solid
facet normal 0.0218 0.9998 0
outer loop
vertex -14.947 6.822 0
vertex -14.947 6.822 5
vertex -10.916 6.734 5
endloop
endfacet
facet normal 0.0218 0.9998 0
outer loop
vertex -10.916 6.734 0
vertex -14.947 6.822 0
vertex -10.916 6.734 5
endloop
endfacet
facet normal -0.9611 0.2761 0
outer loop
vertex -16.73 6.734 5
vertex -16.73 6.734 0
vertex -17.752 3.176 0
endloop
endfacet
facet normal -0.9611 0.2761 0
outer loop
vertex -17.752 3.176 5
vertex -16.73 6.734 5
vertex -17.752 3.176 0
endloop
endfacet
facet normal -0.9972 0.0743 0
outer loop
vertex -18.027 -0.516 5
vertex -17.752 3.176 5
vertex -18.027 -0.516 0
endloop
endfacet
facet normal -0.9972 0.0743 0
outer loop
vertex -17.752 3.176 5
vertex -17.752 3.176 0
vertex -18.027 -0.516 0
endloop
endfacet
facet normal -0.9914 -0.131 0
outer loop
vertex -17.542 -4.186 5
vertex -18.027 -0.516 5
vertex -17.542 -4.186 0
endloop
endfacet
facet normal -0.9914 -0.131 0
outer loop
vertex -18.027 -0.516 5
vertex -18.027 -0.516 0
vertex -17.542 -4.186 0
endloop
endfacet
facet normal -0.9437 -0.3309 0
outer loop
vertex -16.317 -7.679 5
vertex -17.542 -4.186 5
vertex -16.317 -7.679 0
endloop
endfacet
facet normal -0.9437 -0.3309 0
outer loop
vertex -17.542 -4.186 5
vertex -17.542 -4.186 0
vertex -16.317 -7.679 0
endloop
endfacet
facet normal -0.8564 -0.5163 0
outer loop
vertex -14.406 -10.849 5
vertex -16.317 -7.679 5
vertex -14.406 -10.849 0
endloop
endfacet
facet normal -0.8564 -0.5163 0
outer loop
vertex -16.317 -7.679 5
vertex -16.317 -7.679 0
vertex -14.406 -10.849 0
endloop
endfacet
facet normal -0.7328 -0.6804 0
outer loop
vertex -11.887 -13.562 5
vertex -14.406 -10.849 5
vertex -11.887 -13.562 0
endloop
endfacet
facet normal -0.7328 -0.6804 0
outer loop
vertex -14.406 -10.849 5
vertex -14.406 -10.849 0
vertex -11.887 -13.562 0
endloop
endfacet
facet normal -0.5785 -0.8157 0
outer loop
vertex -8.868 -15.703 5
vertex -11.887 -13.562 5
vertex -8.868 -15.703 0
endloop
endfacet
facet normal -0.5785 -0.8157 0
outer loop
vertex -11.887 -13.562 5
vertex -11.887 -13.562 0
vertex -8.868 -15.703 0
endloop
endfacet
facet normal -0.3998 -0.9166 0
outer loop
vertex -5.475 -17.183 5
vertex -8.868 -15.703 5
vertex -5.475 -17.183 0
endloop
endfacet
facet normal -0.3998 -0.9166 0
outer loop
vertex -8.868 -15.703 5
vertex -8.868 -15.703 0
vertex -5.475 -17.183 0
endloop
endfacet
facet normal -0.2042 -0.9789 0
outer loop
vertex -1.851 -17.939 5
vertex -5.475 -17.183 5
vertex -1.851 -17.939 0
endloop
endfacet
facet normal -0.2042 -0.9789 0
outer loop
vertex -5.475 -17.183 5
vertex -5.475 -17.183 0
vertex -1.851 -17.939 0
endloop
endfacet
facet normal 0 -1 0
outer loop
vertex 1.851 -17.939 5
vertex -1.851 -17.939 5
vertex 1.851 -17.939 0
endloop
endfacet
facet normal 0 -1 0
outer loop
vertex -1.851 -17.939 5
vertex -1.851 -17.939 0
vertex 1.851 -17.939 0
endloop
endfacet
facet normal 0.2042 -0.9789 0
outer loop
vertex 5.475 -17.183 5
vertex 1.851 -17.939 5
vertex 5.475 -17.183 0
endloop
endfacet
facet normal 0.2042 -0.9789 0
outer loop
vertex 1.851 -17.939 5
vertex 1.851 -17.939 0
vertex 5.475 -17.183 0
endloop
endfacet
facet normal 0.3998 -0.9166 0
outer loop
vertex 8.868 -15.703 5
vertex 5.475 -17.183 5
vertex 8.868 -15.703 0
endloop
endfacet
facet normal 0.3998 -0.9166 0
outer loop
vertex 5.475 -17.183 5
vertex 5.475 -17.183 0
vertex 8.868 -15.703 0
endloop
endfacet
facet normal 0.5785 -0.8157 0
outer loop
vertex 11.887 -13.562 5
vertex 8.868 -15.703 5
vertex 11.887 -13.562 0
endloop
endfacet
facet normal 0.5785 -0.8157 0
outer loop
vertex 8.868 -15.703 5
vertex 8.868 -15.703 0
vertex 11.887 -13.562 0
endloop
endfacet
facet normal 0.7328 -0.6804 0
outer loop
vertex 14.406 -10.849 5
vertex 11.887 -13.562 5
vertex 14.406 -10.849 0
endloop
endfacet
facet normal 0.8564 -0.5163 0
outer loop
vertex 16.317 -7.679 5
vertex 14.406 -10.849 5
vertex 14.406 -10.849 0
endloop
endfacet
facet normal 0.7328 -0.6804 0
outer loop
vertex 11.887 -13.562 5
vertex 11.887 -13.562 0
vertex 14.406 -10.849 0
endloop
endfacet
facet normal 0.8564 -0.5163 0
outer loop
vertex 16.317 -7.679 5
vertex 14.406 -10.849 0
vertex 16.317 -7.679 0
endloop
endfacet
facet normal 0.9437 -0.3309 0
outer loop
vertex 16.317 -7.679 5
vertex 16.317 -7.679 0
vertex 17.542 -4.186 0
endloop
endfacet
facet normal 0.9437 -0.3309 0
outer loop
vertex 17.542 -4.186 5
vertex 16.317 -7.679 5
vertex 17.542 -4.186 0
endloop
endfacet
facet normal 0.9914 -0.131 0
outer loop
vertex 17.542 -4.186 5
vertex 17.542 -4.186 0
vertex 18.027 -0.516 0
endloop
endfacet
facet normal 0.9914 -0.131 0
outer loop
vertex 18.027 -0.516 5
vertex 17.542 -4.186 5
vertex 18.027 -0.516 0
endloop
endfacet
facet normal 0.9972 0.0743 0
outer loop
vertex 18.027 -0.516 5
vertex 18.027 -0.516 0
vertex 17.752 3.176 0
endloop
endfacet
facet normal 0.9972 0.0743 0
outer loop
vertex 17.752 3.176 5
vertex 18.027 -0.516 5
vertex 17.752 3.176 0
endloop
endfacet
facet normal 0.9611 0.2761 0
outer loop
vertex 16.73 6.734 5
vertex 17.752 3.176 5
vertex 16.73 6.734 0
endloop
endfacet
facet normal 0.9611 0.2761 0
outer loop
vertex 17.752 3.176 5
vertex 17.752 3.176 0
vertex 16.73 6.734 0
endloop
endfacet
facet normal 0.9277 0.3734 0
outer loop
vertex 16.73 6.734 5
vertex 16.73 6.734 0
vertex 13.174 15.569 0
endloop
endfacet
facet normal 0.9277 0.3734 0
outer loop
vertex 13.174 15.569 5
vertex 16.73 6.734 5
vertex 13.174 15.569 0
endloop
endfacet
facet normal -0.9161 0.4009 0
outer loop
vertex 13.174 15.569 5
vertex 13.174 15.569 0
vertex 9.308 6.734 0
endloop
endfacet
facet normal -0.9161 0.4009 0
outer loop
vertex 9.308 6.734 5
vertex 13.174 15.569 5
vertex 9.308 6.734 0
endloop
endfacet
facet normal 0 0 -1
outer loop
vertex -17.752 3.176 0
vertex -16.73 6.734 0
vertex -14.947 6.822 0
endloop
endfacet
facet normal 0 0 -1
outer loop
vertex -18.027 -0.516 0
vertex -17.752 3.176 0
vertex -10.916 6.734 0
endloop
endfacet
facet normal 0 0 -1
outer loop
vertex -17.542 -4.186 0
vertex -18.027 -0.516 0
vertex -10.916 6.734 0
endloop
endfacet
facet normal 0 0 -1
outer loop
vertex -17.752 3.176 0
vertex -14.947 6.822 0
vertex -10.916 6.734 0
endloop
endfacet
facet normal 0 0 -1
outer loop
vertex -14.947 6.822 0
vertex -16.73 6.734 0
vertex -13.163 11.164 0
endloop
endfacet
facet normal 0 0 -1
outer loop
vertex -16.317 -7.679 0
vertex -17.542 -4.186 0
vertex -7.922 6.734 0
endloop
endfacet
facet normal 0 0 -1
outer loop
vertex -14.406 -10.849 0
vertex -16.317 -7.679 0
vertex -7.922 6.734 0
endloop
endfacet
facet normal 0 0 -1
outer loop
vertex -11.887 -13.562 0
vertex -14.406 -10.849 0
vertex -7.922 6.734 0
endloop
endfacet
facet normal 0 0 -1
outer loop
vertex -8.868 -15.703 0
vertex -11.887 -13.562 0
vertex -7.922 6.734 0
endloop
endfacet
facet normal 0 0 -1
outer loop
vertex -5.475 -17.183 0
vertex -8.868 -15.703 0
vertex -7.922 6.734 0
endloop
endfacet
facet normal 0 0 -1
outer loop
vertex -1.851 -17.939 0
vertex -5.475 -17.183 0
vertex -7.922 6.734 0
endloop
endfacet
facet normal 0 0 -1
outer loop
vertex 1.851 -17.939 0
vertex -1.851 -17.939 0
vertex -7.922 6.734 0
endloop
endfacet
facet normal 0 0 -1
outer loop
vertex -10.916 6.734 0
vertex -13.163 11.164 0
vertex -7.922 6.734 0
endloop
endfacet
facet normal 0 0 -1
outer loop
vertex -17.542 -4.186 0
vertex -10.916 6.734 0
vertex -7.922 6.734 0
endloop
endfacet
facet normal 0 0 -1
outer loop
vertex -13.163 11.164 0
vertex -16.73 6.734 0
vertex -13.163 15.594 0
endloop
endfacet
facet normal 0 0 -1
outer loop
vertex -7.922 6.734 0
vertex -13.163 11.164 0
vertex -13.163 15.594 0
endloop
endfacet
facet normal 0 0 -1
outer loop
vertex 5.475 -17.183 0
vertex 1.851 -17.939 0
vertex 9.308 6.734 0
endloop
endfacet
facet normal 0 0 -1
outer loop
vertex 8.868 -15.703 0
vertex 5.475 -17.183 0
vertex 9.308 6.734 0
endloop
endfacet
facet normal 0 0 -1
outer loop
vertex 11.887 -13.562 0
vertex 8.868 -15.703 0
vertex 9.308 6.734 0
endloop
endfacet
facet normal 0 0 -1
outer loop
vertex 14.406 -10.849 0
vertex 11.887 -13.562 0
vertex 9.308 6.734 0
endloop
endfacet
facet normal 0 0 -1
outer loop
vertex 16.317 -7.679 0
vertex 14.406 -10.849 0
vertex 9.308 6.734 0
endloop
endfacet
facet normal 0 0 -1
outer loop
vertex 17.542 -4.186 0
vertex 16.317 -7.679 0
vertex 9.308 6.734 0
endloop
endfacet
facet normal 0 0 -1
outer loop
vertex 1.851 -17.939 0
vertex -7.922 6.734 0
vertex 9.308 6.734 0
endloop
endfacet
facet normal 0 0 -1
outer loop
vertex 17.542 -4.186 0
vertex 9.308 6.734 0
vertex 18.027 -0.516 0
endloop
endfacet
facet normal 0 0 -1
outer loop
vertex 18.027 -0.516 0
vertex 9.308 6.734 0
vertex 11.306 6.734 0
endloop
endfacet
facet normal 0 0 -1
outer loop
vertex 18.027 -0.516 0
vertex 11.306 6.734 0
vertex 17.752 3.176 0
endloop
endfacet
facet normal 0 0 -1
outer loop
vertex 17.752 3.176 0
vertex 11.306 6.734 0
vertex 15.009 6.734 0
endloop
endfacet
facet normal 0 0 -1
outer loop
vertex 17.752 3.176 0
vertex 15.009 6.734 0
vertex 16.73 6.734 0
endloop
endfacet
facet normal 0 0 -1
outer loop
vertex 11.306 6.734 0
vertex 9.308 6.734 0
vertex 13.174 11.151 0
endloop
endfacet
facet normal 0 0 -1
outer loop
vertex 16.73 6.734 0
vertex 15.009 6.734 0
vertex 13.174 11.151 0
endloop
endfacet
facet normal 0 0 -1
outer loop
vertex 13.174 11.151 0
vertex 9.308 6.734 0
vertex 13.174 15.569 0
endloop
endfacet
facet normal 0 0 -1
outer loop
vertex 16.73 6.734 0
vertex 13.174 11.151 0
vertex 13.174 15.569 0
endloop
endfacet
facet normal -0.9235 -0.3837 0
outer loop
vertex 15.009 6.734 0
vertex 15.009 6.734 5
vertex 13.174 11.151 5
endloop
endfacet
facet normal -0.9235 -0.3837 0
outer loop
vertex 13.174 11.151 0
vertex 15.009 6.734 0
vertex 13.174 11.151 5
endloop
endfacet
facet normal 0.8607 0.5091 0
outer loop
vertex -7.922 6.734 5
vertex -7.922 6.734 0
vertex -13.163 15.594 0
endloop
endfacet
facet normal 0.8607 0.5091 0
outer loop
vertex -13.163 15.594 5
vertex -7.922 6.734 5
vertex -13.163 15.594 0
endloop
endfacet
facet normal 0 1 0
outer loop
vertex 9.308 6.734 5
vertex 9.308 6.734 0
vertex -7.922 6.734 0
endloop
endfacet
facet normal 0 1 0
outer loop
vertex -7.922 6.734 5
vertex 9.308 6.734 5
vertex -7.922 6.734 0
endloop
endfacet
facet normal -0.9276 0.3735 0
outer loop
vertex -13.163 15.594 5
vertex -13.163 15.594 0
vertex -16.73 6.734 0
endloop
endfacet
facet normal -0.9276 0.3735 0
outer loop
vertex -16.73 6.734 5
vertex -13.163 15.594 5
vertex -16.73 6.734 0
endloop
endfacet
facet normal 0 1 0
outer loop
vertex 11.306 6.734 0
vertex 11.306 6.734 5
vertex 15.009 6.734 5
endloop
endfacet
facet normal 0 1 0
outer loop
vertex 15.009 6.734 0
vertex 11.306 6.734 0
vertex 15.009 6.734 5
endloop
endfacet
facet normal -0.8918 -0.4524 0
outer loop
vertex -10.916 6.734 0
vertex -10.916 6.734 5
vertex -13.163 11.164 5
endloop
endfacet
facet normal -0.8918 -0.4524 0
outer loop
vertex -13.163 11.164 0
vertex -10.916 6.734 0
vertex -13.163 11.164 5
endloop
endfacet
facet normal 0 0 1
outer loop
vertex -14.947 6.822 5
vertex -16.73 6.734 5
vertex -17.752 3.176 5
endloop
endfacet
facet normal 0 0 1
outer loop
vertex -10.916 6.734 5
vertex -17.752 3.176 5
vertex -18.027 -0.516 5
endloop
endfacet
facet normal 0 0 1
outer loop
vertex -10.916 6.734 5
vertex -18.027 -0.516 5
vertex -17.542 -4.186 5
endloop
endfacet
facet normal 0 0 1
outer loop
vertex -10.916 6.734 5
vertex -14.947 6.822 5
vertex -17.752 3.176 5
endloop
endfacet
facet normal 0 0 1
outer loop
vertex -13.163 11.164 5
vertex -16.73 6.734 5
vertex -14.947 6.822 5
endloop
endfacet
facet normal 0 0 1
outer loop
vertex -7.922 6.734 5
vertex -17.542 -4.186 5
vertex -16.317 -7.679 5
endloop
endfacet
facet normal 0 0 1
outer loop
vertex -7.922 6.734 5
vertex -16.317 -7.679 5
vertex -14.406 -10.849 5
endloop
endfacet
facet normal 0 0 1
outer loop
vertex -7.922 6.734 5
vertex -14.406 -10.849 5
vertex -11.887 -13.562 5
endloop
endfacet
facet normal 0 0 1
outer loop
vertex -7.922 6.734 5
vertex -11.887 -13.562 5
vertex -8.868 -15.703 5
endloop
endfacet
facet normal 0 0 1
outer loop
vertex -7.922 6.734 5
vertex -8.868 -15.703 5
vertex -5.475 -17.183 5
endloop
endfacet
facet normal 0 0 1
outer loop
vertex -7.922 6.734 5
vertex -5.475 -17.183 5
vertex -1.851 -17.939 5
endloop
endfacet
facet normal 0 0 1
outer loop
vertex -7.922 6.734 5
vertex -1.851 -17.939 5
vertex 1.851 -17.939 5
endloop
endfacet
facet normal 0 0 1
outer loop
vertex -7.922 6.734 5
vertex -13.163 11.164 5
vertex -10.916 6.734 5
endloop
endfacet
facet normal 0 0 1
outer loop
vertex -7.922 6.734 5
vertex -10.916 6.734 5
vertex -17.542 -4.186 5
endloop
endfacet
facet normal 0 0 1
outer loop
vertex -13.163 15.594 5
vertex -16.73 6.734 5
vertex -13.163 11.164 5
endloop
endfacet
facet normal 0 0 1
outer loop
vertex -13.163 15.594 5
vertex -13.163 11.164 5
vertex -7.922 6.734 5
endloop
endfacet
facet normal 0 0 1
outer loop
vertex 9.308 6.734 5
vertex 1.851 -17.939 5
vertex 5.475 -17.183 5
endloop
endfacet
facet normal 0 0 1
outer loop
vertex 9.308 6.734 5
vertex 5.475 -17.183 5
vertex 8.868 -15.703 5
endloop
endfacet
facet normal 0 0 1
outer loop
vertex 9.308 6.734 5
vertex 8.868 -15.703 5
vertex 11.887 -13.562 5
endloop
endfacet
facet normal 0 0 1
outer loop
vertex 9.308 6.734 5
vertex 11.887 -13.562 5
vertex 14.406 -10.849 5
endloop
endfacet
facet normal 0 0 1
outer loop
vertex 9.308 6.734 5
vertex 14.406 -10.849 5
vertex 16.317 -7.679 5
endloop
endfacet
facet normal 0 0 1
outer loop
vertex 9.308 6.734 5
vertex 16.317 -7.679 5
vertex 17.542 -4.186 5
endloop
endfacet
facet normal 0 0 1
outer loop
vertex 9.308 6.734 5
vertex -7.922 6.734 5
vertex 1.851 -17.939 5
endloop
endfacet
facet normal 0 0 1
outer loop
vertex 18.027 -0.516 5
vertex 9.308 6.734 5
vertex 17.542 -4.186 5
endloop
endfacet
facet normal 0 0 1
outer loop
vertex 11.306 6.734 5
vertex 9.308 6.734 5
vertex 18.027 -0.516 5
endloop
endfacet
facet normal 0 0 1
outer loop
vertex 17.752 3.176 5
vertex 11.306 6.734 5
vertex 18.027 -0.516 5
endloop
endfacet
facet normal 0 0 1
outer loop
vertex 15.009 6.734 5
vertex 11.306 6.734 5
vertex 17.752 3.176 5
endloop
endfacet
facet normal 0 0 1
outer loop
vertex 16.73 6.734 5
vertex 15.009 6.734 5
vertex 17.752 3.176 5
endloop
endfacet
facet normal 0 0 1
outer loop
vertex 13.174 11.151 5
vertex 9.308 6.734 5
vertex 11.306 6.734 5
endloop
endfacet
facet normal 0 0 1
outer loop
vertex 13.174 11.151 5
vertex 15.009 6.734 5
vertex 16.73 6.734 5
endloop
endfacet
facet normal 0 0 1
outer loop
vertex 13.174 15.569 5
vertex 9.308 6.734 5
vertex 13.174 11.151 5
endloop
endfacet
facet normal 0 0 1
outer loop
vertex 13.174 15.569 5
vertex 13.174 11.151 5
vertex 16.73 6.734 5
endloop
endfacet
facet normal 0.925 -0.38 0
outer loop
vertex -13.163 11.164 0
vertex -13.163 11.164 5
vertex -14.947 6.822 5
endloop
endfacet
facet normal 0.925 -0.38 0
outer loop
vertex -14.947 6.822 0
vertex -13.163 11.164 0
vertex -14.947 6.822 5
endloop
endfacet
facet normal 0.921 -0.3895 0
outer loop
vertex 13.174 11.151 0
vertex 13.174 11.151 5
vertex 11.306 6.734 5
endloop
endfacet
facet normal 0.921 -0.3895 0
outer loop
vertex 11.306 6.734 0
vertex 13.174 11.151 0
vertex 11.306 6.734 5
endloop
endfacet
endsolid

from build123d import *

# Parameters (mm, degrees)
F1_DEPTH = 5
F3_DEPTH = 15
F5_DEPTH = 25


with BuildPart() as f1:
    # F0 (on Top) → F1 (new body)
    with BuildSketch(Plane.XY):
        with BuildLine():
            Line((-13.163356, 15.594428), (-16.72976, 6.733515))
            ThreePointArc((-16.72976, 6.733515), (0, -18.033999), (16.72976, 6.733515))
            Line((16.72976, 6.733515), (13.173763, 15.568571))
            Line((13.173763, 15.568571), (9.308094, 6.733515))
            Line((9.308094, 6.733515), (-7.921782, 6.733515))
            Line((-7.921782, 6.733515), (-13.163356, 15.594428))
        make_face()
    extrude(amount=F1_DEPTH)

    # F2 (on face) → F3 (cut)
    with BuildSketch(Plane.XY.offset(5)):
        Polygon((-13.163356, 11.163971), (-14.946558, 6.822401), (-10.915843, 6.733515), align=None)
    extrude(amount=-F3_DEPTH, mode=Mode.SUBTRACT)

    # F4 (on face) → F5 (cut)
    with BuildSketch(Plane.XY.offset(5)):
        Polygon((13.173763, 11.151043), (11.305694, 6.733515), (15.009284, 6.733515), align=None)
    extrude(amount=-F5_DEPTH, mode=Mode.SUBTRACT)


solid = f1.part
